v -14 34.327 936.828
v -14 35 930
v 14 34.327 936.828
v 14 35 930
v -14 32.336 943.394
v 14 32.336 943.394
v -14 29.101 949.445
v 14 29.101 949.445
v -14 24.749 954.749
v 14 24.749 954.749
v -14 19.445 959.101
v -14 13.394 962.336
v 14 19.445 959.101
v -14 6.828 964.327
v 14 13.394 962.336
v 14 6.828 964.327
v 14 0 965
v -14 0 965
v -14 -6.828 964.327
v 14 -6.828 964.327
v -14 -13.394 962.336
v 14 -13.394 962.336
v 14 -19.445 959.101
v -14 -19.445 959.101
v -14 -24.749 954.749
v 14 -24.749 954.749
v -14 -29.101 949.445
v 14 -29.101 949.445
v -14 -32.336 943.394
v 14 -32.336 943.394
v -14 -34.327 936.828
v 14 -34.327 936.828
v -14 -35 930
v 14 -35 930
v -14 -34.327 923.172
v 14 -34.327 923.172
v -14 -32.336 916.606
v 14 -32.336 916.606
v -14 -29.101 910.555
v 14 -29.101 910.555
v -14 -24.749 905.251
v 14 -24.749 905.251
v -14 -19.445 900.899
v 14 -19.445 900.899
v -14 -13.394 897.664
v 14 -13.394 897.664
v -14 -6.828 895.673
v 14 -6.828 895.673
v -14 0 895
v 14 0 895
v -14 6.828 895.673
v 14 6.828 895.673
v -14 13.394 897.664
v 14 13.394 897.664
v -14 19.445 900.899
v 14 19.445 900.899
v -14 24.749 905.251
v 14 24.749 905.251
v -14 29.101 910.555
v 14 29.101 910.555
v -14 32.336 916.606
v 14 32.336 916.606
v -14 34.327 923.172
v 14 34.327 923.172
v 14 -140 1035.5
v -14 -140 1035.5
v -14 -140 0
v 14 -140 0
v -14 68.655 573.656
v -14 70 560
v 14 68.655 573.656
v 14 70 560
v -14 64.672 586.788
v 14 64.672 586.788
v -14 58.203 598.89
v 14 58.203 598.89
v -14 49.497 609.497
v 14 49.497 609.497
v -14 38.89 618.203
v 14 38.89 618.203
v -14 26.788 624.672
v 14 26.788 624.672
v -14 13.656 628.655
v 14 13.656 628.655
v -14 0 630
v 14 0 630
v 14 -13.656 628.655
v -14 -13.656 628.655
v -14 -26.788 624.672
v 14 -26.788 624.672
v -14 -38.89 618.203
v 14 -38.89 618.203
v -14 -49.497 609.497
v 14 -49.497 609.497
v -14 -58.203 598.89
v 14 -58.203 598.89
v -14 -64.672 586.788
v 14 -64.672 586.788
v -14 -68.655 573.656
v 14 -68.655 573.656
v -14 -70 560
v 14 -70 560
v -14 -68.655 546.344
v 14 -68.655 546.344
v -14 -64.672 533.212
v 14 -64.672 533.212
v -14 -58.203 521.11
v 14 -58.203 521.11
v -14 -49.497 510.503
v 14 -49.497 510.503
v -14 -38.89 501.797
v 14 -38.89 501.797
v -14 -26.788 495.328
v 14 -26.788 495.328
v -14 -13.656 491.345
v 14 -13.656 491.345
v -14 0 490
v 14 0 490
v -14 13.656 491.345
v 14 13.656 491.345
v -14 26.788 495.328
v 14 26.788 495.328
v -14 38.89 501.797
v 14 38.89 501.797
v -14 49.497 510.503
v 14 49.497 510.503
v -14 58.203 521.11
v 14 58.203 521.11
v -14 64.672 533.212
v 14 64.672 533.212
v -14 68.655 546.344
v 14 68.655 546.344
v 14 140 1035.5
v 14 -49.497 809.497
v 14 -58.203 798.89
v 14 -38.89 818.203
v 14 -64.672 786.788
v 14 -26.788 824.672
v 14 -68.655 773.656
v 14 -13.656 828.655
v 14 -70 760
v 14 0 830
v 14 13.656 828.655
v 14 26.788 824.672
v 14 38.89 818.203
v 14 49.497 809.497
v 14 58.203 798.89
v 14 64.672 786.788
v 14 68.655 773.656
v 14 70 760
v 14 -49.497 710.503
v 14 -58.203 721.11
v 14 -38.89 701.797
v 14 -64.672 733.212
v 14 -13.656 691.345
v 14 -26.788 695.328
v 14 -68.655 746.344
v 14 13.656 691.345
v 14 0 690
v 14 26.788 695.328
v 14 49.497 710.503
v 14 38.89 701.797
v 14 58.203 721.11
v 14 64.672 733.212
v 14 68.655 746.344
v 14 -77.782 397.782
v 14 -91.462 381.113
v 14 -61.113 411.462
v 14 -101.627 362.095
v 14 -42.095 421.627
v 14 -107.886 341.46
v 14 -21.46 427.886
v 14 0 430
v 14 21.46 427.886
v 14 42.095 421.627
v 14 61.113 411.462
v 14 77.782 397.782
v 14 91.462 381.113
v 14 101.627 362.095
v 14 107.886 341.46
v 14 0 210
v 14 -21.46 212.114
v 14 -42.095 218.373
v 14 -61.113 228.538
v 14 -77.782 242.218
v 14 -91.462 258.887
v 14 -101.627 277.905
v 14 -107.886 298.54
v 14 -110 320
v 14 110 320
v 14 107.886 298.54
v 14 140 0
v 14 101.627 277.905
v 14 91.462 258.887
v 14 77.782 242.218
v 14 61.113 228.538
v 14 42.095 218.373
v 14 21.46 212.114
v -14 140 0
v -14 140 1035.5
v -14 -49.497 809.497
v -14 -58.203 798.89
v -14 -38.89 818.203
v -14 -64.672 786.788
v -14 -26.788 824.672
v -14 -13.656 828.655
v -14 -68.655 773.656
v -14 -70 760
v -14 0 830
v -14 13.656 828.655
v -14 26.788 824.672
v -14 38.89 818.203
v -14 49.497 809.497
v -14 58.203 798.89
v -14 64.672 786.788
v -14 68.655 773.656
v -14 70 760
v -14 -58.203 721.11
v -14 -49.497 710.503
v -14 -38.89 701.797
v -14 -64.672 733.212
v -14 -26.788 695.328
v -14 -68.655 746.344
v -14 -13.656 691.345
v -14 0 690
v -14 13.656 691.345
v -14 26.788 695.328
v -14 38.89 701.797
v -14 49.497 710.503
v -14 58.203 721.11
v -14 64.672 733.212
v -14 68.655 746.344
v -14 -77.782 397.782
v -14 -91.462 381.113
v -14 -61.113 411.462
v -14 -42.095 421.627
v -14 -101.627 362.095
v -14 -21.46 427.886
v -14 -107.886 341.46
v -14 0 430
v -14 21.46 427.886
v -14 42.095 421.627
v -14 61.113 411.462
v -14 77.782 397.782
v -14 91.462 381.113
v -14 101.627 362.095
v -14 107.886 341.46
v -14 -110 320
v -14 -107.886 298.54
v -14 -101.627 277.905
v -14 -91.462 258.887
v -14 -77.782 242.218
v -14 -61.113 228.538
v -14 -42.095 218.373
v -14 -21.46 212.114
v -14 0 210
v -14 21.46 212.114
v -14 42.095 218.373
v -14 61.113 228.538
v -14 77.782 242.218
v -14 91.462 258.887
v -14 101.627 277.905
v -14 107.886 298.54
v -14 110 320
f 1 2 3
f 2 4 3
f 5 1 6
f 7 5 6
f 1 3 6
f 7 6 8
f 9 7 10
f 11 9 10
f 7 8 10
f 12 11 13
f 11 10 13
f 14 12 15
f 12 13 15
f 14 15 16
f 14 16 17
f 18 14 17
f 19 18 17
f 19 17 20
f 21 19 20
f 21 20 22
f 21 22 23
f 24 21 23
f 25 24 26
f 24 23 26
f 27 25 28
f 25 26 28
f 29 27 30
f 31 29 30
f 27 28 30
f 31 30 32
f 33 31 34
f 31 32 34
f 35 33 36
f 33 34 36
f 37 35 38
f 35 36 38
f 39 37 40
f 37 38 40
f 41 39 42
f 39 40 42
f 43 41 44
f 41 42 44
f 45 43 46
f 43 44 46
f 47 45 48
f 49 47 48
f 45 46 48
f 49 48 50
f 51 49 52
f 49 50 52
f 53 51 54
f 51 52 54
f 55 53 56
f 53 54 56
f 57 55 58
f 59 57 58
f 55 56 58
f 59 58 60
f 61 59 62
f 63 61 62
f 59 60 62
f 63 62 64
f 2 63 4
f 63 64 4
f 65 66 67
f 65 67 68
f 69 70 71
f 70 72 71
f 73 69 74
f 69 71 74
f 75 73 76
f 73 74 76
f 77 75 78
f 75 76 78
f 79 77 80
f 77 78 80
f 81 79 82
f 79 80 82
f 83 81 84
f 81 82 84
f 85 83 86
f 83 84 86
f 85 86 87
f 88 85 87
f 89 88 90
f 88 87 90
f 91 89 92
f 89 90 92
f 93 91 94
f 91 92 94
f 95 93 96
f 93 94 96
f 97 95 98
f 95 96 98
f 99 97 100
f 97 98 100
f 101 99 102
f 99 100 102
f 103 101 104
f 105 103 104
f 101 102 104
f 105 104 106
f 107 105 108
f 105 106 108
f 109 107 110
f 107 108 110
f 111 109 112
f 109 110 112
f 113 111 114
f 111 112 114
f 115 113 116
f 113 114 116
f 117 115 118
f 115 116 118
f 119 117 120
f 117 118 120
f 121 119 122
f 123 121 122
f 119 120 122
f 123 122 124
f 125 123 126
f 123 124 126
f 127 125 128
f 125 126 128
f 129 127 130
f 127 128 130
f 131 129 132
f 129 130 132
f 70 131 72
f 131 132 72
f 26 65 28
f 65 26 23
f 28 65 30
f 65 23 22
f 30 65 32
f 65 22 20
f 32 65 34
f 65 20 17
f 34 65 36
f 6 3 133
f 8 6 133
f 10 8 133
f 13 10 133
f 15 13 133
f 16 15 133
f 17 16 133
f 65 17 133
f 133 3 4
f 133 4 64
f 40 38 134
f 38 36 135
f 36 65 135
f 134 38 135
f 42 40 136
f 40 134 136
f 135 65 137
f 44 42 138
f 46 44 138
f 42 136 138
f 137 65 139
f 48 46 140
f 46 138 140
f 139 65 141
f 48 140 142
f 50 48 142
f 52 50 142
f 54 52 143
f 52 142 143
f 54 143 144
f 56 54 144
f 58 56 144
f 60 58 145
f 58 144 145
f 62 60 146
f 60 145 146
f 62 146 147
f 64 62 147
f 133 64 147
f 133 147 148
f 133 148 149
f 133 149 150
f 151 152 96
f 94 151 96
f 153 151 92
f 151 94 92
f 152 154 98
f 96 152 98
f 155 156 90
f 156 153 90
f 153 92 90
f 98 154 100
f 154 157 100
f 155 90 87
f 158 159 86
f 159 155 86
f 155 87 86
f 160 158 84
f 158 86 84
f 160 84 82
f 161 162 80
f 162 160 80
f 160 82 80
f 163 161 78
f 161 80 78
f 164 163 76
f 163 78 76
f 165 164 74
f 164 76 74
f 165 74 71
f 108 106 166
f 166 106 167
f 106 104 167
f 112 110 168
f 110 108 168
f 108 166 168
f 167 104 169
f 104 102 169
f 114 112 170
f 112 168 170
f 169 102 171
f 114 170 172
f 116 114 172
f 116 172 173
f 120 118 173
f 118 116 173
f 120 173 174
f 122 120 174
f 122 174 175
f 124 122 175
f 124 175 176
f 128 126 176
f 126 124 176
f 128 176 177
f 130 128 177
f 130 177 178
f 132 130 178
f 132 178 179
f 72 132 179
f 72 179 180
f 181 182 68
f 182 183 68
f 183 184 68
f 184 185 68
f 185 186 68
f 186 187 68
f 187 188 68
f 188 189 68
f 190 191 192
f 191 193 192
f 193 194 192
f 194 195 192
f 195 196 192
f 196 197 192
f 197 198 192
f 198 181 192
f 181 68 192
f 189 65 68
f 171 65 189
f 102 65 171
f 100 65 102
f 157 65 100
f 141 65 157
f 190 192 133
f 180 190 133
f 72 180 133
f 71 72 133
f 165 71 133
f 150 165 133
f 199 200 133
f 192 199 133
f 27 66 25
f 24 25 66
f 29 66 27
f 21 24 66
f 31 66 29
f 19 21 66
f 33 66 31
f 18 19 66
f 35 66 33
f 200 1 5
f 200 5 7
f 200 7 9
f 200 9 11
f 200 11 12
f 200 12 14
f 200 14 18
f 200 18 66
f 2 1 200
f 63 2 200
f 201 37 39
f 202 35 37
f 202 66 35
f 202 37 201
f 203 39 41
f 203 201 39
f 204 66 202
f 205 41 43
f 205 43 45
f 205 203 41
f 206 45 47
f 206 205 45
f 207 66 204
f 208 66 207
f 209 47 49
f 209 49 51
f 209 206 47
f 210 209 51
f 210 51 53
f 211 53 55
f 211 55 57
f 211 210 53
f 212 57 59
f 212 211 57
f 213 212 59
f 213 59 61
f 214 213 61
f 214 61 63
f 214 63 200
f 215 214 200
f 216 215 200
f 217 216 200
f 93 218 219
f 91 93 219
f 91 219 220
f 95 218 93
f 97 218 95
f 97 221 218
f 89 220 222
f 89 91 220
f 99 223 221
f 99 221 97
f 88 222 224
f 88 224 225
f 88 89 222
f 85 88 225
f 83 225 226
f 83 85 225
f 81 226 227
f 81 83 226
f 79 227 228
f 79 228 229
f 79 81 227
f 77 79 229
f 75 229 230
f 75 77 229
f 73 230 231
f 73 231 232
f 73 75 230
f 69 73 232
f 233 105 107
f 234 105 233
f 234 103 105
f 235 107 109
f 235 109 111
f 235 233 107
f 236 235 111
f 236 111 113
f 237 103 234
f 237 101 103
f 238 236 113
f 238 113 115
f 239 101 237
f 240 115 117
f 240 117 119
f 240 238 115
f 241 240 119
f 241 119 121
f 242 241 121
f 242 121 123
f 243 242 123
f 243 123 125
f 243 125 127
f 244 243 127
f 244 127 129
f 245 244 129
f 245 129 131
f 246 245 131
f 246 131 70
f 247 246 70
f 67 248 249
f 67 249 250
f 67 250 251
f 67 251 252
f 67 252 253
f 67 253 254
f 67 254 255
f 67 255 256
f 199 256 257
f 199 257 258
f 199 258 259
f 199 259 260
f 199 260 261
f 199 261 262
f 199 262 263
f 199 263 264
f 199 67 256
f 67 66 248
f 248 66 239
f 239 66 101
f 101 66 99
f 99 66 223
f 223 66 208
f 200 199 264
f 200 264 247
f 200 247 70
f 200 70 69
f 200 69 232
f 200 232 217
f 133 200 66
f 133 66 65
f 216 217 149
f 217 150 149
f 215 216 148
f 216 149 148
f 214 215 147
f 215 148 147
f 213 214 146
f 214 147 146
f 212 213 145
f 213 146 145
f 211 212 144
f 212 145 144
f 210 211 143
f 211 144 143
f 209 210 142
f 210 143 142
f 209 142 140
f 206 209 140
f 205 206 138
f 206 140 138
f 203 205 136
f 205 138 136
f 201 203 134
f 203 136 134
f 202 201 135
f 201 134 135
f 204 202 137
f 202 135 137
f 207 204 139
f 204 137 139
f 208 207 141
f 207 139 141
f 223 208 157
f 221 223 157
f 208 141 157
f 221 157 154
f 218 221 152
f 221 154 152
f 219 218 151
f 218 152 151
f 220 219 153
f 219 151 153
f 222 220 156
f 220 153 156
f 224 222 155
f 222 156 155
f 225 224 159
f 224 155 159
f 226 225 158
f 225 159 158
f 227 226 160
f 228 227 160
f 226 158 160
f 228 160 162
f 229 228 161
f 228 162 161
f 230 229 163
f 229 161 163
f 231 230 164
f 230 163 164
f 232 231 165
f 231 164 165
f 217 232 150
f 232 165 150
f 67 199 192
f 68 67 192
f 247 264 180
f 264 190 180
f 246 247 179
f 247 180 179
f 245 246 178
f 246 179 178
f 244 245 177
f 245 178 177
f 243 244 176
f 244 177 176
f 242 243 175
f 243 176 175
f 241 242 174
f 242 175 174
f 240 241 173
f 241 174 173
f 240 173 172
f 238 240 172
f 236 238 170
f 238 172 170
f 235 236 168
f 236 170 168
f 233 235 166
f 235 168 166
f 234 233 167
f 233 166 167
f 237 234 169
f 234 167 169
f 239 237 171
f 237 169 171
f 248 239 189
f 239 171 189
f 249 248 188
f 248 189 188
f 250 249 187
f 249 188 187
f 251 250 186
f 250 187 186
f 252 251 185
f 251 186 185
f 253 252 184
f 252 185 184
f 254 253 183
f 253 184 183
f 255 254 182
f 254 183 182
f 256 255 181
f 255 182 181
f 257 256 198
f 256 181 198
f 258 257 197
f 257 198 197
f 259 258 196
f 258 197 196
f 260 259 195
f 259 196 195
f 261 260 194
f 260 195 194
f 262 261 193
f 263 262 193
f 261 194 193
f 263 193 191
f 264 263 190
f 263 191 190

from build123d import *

# Parameters (mm, degrees)
F0_W     = 28
F0_H     = 280
F1_DEPTH = 1035.5
F2_R     = 110
F2_R_2   = 70
F2_R_3   = 35
F3_DEPTH = 50


with BuildPart() as f1:
    # F0 (on Top) → F1 (new body)
    with BuildSketch(Plane.XY):
        Rectangle(F0_W, F0_H)
    extrude(amount=F1_DEPTH)

    # F2 (on Right) → F3 (cut, symmetric)
    with BuildSketch(Plane.YZ):
        with Locations((0, 320)):
            Circle(F2_R)
        with Locations((0, 560)):
            Circle(F2_R_2)
        with Locations((0, 760)):
            Circle(F2_R_2)
        with Locations((0, 930)):
            Circle(F2_R_3)
    extrude(amount=F3_DEPTH, both=True, mode=Mode.SUBTRACT)


solid = f1.part
